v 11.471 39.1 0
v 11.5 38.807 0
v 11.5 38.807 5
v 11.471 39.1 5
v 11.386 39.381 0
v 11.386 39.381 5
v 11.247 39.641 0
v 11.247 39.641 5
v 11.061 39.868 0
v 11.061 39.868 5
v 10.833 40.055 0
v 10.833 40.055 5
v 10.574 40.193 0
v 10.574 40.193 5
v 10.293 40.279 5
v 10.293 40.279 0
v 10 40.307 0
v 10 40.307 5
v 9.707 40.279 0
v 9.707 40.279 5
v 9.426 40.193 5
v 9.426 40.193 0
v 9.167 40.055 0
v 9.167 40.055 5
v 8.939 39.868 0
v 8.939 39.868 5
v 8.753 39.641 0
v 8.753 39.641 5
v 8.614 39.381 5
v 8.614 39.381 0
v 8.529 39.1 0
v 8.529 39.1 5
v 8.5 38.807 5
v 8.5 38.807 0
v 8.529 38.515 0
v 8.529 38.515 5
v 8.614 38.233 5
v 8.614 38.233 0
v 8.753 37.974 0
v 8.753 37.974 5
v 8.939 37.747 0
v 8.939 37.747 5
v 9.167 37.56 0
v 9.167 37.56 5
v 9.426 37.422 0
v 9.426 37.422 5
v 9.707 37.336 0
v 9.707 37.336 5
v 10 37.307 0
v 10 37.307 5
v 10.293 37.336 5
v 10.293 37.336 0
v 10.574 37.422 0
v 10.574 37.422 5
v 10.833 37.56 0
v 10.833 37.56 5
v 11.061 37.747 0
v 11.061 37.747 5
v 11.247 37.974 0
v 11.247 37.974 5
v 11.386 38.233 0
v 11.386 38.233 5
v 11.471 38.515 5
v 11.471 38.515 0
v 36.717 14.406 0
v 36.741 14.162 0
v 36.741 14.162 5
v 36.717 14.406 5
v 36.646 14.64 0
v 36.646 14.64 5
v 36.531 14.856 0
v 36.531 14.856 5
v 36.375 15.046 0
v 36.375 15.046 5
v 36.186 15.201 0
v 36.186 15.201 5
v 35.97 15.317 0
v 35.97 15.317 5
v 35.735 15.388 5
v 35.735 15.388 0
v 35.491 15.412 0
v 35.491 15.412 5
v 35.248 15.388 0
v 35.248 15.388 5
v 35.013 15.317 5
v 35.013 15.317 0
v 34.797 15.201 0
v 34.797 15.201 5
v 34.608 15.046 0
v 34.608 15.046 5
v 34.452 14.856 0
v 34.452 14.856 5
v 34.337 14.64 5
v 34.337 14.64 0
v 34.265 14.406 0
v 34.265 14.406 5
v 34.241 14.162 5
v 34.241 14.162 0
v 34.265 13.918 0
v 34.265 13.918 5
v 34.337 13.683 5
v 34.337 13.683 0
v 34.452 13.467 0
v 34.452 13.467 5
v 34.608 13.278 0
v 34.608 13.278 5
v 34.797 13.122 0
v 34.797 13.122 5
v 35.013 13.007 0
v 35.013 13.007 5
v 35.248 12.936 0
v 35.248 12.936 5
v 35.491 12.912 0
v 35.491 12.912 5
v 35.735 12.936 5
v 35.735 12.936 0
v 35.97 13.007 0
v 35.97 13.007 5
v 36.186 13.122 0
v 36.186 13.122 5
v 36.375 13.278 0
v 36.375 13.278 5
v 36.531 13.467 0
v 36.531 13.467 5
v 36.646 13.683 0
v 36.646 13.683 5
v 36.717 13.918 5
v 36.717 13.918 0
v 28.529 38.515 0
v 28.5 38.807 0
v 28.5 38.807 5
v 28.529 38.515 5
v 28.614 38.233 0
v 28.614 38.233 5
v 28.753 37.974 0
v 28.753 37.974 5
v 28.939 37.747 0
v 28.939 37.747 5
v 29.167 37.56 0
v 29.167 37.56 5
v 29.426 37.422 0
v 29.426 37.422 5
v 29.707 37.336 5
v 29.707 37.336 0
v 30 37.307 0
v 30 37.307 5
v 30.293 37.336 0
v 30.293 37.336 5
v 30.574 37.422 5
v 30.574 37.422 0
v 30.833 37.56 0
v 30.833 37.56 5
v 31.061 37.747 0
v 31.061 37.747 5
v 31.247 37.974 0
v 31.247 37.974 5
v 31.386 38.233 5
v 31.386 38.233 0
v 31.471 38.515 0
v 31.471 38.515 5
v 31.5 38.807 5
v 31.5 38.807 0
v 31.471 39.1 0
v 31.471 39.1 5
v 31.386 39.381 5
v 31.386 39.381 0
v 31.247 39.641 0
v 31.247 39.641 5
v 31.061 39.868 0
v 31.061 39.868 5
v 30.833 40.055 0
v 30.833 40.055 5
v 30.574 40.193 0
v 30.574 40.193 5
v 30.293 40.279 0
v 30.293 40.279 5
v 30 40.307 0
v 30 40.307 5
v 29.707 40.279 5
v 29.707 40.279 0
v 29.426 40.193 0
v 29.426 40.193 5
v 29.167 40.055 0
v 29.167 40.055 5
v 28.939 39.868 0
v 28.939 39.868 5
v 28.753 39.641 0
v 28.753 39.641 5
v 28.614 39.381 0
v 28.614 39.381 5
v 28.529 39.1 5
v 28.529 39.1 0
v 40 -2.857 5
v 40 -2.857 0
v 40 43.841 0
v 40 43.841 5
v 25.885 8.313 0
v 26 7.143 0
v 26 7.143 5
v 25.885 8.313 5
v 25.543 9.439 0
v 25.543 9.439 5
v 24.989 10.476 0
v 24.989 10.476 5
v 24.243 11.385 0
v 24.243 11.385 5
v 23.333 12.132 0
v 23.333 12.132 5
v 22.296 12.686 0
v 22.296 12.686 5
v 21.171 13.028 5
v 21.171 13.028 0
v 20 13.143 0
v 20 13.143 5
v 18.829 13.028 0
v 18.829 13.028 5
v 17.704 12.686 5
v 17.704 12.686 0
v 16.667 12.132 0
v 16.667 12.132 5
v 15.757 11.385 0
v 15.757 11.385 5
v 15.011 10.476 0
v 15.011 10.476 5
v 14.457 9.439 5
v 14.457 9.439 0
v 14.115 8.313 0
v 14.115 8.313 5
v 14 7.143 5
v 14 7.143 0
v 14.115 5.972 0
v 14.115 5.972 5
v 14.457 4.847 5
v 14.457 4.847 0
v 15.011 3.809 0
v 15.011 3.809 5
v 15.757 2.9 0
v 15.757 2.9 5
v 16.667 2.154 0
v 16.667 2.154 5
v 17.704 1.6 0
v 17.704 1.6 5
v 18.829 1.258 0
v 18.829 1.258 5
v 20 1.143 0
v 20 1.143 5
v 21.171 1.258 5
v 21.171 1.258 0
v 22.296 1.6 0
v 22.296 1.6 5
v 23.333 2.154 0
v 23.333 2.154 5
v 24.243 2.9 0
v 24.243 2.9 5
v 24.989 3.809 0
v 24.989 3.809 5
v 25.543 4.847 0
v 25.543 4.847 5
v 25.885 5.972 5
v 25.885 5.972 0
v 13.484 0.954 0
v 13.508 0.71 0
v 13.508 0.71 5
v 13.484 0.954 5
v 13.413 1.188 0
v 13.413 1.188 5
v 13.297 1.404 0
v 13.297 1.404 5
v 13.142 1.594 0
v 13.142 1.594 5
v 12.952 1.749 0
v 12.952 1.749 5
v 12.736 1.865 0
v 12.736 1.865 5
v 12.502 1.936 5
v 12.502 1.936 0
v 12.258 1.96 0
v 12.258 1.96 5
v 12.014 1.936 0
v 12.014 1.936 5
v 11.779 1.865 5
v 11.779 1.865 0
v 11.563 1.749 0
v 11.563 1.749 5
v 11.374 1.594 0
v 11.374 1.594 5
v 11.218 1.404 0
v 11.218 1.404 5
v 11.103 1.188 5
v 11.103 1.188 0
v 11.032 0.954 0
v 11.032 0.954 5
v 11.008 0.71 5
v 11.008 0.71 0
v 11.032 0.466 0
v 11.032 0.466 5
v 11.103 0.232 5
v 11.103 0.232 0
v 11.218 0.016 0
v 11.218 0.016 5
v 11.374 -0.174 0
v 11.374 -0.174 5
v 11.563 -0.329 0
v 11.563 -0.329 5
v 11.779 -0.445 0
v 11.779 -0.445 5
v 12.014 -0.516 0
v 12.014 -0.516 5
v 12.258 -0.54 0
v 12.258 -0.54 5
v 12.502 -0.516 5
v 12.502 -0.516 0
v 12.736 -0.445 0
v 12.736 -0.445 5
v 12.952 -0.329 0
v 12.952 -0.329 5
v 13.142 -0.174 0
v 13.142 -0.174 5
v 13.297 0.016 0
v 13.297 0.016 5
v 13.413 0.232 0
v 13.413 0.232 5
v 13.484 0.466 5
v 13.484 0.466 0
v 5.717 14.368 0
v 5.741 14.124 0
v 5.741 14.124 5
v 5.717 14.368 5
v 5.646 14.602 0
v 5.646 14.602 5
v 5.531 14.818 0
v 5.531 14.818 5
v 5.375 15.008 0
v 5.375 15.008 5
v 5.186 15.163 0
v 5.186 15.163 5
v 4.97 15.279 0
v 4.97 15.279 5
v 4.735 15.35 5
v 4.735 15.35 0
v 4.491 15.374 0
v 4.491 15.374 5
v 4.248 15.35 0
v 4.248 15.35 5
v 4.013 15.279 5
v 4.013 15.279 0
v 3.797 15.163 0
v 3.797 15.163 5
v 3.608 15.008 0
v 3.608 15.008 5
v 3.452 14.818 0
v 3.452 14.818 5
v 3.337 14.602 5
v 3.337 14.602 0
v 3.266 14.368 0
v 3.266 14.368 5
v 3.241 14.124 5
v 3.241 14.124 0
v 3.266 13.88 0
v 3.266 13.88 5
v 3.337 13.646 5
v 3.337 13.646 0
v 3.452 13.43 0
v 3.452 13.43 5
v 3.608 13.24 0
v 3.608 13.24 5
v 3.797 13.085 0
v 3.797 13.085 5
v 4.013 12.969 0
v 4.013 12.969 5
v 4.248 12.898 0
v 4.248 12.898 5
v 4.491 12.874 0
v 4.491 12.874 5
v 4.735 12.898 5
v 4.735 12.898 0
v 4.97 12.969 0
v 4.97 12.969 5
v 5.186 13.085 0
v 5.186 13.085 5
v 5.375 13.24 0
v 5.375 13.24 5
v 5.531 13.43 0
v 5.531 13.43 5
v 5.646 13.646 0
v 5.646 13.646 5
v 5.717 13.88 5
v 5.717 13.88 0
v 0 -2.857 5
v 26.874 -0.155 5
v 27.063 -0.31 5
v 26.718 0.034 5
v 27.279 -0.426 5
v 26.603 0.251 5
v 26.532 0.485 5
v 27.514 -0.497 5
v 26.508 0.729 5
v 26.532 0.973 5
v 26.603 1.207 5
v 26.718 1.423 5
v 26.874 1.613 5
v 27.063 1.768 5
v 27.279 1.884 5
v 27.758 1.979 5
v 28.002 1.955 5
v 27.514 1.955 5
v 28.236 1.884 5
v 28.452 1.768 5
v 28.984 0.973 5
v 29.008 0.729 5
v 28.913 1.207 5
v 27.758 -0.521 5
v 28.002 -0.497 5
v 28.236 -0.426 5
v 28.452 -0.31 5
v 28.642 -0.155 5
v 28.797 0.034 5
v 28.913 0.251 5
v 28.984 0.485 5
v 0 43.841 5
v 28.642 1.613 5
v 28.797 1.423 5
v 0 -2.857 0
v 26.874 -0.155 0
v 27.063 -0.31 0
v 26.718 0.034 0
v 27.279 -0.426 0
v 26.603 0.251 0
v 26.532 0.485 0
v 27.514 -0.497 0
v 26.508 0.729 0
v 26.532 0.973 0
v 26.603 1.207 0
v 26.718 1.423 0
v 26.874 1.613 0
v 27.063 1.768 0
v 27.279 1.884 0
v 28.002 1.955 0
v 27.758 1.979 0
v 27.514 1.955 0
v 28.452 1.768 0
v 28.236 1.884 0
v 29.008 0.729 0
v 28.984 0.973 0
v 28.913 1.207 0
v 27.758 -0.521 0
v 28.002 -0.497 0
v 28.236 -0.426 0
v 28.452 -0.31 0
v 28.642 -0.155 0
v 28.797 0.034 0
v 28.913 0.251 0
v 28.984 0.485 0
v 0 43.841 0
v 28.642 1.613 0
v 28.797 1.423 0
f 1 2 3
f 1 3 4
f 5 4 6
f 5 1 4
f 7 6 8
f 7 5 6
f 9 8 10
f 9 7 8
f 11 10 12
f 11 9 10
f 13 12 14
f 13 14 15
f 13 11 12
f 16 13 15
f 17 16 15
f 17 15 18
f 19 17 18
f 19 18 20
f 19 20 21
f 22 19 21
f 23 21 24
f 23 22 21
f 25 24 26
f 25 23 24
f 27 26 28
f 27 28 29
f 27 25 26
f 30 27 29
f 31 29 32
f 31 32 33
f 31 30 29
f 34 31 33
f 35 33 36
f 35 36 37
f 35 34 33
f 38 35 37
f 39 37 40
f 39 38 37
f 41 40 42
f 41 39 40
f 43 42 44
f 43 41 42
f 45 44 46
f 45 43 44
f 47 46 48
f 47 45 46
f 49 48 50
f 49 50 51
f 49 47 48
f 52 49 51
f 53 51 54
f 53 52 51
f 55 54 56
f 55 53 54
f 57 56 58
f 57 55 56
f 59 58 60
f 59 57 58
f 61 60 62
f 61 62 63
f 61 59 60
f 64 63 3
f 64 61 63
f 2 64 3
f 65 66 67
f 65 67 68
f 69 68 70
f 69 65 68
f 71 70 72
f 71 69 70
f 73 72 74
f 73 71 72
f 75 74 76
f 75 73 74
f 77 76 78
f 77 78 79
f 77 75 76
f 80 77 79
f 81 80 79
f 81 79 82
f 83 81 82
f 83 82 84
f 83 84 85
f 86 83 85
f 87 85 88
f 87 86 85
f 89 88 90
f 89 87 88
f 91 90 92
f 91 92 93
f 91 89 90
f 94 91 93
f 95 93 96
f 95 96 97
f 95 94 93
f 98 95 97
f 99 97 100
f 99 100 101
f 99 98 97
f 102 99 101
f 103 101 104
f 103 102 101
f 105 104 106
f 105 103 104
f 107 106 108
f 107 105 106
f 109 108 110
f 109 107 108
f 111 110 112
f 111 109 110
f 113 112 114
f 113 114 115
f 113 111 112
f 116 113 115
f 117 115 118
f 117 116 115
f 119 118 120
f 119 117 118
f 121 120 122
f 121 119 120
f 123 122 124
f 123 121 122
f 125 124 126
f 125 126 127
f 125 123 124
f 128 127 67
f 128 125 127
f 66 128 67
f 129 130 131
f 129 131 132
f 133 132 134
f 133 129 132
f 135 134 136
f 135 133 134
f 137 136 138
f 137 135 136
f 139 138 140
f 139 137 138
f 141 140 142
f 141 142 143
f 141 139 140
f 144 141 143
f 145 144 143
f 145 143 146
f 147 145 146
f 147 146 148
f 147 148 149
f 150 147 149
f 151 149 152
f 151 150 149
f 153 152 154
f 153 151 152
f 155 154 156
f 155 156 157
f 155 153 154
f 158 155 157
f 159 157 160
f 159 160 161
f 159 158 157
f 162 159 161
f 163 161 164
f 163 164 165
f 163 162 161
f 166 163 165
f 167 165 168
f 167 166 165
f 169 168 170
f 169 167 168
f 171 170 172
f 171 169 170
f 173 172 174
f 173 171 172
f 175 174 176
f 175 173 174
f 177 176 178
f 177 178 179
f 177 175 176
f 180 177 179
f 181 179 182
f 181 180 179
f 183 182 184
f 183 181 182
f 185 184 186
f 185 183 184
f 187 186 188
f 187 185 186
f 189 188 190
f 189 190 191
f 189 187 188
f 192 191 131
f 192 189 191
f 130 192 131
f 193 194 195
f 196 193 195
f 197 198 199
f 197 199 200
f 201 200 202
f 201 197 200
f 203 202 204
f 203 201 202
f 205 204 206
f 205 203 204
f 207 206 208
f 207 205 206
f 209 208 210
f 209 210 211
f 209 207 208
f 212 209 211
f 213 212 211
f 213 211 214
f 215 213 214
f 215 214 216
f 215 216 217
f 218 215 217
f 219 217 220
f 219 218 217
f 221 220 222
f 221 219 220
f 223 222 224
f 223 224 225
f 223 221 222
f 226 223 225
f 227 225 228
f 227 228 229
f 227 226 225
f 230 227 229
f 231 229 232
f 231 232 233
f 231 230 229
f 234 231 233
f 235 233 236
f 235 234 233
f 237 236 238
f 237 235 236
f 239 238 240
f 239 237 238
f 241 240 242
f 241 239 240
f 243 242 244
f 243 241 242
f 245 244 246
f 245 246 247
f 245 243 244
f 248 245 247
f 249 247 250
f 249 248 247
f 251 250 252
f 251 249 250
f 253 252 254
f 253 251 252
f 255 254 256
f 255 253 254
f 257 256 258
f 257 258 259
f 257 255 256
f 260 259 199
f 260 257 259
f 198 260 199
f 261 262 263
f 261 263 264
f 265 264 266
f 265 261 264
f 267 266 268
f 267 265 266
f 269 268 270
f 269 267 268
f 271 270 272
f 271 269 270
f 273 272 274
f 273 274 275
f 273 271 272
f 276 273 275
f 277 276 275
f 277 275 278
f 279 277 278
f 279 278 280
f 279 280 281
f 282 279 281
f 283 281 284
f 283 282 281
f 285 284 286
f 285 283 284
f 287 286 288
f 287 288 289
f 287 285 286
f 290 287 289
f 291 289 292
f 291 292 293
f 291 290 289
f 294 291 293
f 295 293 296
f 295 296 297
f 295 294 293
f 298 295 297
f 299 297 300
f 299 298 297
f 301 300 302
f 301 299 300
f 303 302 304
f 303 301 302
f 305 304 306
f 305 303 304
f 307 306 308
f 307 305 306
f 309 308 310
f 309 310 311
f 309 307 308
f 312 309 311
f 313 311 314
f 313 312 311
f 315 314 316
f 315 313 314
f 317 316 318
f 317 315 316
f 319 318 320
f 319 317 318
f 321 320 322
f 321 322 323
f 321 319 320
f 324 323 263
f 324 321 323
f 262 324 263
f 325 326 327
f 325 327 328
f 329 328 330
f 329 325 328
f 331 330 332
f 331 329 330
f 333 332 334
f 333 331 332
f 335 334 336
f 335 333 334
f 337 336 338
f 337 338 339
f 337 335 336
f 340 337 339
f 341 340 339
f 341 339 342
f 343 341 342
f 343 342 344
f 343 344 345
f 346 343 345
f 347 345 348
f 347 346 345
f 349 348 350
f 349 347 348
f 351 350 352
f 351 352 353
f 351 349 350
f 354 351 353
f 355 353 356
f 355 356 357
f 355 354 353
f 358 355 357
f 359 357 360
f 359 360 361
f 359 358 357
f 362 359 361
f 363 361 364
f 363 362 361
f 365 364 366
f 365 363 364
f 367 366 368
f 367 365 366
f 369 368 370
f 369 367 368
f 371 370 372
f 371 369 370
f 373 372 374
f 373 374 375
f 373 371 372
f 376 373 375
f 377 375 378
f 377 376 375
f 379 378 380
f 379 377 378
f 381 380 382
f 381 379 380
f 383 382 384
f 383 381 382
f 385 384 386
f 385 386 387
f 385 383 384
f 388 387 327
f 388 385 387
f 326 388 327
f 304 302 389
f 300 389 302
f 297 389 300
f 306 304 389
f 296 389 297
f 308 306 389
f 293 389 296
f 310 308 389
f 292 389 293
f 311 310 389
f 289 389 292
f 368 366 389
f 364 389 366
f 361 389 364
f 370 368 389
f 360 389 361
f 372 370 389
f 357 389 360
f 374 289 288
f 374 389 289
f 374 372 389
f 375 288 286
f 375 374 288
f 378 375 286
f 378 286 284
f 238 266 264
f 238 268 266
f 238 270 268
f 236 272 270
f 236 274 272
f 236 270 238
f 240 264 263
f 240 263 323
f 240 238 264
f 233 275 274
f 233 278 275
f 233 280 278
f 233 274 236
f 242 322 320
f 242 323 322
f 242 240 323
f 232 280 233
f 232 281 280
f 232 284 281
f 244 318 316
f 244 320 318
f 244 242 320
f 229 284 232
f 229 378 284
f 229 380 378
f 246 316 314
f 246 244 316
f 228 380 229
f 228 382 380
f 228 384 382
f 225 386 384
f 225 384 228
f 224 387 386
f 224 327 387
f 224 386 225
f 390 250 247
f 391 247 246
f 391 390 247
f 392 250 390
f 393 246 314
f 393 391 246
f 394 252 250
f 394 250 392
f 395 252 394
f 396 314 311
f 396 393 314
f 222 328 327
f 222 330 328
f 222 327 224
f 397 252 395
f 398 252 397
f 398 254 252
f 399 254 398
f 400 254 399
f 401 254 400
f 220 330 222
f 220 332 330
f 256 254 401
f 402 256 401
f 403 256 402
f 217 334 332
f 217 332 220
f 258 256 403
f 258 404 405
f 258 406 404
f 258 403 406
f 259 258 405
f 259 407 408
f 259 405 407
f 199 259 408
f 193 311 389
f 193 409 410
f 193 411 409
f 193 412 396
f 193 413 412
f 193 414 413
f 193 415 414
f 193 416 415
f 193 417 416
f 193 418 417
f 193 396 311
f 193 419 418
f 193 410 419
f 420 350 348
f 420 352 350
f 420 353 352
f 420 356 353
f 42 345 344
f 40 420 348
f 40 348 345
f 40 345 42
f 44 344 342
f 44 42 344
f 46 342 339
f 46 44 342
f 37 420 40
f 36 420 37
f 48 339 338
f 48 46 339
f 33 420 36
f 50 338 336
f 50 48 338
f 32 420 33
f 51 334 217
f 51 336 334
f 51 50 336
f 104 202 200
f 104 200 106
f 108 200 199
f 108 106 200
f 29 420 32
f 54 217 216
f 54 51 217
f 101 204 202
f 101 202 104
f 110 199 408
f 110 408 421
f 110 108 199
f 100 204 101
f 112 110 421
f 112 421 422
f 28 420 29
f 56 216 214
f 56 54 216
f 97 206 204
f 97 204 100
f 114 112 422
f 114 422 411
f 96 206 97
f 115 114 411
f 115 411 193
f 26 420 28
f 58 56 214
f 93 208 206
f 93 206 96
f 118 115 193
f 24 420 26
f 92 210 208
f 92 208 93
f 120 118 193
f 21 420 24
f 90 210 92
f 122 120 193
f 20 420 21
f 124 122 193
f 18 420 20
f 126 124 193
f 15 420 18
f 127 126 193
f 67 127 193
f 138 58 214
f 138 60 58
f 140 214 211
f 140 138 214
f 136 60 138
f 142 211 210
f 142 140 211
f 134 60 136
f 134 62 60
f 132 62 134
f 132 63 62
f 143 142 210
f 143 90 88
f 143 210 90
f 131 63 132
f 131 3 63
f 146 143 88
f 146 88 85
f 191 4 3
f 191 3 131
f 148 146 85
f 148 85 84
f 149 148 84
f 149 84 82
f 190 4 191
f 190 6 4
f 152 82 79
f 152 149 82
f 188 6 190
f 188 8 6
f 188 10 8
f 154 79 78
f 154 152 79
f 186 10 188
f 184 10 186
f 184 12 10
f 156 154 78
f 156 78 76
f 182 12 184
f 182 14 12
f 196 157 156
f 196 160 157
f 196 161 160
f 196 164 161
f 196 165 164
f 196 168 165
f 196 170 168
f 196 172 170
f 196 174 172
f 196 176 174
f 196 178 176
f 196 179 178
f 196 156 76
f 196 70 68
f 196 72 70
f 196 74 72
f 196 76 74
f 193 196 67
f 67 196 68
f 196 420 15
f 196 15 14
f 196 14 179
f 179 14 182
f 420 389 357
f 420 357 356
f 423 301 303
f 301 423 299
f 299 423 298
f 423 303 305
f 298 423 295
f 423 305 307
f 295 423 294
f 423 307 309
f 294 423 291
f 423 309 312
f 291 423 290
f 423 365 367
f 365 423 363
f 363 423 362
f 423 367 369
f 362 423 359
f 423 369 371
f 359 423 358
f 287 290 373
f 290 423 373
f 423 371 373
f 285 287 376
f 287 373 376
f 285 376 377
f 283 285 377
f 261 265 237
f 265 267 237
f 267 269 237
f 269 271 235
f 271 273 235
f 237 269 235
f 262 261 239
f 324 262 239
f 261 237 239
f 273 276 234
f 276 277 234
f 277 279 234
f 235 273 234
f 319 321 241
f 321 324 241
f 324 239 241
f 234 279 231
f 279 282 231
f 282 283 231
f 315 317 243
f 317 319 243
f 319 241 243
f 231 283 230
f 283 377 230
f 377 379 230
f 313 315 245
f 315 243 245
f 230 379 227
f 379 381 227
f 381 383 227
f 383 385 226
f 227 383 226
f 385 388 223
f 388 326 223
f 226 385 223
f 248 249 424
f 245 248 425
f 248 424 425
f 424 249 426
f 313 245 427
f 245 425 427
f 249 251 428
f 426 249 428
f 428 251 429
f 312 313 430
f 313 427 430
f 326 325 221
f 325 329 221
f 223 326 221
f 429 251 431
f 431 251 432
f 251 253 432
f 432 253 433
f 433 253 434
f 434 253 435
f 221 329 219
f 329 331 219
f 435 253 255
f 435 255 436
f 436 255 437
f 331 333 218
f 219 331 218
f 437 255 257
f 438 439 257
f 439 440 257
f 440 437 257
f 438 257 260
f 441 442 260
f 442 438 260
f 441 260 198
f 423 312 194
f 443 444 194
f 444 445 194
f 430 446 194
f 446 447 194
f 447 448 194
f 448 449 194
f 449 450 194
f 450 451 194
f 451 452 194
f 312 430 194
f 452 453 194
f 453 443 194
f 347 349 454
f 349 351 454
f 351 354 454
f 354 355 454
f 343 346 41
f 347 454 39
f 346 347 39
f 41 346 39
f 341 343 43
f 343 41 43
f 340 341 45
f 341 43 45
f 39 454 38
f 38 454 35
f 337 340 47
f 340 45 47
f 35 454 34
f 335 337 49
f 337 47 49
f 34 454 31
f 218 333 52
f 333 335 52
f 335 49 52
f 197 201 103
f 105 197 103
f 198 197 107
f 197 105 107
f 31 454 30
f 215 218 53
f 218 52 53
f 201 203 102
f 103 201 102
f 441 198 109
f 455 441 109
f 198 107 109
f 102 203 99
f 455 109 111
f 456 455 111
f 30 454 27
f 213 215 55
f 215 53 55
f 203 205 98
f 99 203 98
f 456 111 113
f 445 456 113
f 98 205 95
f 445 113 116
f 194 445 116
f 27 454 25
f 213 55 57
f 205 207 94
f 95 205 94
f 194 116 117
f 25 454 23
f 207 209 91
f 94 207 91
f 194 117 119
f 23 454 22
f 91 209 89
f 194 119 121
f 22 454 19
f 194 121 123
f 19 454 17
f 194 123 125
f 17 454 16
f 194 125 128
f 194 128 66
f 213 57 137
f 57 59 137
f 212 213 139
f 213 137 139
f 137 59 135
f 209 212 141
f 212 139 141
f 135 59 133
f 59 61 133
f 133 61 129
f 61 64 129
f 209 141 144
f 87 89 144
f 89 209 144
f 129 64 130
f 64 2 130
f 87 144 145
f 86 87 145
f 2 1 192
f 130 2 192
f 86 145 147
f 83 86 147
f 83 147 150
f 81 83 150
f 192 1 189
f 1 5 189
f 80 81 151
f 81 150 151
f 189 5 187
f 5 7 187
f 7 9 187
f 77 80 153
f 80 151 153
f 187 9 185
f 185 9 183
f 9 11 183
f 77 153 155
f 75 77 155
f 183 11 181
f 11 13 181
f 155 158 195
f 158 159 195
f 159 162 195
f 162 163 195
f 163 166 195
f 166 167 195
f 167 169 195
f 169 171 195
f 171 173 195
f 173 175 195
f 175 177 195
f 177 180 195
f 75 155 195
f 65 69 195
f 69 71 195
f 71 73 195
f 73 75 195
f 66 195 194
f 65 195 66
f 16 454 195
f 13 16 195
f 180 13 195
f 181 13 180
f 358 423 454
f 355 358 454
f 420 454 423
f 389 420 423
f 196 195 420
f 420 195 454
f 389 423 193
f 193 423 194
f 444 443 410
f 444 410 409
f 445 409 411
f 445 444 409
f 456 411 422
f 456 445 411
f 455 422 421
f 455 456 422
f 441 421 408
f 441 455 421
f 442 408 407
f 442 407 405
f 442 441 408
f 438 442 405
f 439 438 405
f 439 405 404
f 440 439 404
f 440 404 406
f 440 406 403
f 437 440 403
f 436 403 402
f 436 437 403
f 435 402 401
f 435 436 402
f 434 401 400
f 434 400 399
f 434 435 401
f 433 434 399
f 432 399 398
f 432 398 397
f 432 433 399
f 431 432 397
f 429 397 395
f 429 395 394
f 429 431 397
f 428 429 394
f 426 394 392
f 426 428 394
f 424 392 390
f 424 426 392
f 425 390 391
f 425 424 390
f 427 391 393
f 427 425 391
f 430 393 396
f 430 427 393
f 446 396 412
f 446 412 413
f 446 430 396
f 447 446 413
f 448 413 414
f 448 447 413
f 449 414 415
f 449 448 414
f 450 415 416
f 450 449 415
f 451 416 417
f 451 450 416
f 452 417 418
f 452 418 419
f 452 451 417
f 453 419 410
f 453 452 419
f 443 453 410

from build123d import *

# Parameters (mm, degrees)
SKETCH1_R           = 6
SKETCH1_R_2         = 1.25
SKETCH1_R_3         = 1.5
BOSS_EXTRUDE1_DEPTH = 5


with BuildPart() as part:
    # Sketch1 → Boss-Extrude1 (new body)
    with BuildSketch(Plane.XY):
        Polygon((0, -2.857142857), (40, -2.857142857), (40, 37.142857143), (40, 43.840888812), (0, 43.840888812), (0, 37.142857143), align=None)
        with Locations((20, 7.142857143)):
            Circle(SKETCH1_R, mode=Mode.SUBTRACT)
        with Locations((4.491483608, 14.123968753)):
            Circle(SKETCH1_R_2, mode=Mode.SUBTRACT)
        with Locations((12.257831183, 0.710026553)):
            Circle(SKETCH1_R_2, mode=Mode.SUBTRACT)
        with Locations((27.757819681, 0.728909749)):
            Circle(SKETCH1_R_2, mode=Mode.SUBTRACT)
        with Locations((35.491460603, 14.161735143)):
            Circle(SKETCH1_R_2, mode=Mode.SUBTRACT)
        with Locations((10, 38.807411058)):
            Circle(SKETCH1_R_3, mode=Mode.SUBTRACT)
        with Locations(Location((30, 38.807411058, 0), (0, 0, 180))):
            Circle(SKETCH1_R_3, mode=Mode.SUBTRACT)
    extrude(amount=BOSS_EXTRUDE1_DEPTH)


solid = part.part
